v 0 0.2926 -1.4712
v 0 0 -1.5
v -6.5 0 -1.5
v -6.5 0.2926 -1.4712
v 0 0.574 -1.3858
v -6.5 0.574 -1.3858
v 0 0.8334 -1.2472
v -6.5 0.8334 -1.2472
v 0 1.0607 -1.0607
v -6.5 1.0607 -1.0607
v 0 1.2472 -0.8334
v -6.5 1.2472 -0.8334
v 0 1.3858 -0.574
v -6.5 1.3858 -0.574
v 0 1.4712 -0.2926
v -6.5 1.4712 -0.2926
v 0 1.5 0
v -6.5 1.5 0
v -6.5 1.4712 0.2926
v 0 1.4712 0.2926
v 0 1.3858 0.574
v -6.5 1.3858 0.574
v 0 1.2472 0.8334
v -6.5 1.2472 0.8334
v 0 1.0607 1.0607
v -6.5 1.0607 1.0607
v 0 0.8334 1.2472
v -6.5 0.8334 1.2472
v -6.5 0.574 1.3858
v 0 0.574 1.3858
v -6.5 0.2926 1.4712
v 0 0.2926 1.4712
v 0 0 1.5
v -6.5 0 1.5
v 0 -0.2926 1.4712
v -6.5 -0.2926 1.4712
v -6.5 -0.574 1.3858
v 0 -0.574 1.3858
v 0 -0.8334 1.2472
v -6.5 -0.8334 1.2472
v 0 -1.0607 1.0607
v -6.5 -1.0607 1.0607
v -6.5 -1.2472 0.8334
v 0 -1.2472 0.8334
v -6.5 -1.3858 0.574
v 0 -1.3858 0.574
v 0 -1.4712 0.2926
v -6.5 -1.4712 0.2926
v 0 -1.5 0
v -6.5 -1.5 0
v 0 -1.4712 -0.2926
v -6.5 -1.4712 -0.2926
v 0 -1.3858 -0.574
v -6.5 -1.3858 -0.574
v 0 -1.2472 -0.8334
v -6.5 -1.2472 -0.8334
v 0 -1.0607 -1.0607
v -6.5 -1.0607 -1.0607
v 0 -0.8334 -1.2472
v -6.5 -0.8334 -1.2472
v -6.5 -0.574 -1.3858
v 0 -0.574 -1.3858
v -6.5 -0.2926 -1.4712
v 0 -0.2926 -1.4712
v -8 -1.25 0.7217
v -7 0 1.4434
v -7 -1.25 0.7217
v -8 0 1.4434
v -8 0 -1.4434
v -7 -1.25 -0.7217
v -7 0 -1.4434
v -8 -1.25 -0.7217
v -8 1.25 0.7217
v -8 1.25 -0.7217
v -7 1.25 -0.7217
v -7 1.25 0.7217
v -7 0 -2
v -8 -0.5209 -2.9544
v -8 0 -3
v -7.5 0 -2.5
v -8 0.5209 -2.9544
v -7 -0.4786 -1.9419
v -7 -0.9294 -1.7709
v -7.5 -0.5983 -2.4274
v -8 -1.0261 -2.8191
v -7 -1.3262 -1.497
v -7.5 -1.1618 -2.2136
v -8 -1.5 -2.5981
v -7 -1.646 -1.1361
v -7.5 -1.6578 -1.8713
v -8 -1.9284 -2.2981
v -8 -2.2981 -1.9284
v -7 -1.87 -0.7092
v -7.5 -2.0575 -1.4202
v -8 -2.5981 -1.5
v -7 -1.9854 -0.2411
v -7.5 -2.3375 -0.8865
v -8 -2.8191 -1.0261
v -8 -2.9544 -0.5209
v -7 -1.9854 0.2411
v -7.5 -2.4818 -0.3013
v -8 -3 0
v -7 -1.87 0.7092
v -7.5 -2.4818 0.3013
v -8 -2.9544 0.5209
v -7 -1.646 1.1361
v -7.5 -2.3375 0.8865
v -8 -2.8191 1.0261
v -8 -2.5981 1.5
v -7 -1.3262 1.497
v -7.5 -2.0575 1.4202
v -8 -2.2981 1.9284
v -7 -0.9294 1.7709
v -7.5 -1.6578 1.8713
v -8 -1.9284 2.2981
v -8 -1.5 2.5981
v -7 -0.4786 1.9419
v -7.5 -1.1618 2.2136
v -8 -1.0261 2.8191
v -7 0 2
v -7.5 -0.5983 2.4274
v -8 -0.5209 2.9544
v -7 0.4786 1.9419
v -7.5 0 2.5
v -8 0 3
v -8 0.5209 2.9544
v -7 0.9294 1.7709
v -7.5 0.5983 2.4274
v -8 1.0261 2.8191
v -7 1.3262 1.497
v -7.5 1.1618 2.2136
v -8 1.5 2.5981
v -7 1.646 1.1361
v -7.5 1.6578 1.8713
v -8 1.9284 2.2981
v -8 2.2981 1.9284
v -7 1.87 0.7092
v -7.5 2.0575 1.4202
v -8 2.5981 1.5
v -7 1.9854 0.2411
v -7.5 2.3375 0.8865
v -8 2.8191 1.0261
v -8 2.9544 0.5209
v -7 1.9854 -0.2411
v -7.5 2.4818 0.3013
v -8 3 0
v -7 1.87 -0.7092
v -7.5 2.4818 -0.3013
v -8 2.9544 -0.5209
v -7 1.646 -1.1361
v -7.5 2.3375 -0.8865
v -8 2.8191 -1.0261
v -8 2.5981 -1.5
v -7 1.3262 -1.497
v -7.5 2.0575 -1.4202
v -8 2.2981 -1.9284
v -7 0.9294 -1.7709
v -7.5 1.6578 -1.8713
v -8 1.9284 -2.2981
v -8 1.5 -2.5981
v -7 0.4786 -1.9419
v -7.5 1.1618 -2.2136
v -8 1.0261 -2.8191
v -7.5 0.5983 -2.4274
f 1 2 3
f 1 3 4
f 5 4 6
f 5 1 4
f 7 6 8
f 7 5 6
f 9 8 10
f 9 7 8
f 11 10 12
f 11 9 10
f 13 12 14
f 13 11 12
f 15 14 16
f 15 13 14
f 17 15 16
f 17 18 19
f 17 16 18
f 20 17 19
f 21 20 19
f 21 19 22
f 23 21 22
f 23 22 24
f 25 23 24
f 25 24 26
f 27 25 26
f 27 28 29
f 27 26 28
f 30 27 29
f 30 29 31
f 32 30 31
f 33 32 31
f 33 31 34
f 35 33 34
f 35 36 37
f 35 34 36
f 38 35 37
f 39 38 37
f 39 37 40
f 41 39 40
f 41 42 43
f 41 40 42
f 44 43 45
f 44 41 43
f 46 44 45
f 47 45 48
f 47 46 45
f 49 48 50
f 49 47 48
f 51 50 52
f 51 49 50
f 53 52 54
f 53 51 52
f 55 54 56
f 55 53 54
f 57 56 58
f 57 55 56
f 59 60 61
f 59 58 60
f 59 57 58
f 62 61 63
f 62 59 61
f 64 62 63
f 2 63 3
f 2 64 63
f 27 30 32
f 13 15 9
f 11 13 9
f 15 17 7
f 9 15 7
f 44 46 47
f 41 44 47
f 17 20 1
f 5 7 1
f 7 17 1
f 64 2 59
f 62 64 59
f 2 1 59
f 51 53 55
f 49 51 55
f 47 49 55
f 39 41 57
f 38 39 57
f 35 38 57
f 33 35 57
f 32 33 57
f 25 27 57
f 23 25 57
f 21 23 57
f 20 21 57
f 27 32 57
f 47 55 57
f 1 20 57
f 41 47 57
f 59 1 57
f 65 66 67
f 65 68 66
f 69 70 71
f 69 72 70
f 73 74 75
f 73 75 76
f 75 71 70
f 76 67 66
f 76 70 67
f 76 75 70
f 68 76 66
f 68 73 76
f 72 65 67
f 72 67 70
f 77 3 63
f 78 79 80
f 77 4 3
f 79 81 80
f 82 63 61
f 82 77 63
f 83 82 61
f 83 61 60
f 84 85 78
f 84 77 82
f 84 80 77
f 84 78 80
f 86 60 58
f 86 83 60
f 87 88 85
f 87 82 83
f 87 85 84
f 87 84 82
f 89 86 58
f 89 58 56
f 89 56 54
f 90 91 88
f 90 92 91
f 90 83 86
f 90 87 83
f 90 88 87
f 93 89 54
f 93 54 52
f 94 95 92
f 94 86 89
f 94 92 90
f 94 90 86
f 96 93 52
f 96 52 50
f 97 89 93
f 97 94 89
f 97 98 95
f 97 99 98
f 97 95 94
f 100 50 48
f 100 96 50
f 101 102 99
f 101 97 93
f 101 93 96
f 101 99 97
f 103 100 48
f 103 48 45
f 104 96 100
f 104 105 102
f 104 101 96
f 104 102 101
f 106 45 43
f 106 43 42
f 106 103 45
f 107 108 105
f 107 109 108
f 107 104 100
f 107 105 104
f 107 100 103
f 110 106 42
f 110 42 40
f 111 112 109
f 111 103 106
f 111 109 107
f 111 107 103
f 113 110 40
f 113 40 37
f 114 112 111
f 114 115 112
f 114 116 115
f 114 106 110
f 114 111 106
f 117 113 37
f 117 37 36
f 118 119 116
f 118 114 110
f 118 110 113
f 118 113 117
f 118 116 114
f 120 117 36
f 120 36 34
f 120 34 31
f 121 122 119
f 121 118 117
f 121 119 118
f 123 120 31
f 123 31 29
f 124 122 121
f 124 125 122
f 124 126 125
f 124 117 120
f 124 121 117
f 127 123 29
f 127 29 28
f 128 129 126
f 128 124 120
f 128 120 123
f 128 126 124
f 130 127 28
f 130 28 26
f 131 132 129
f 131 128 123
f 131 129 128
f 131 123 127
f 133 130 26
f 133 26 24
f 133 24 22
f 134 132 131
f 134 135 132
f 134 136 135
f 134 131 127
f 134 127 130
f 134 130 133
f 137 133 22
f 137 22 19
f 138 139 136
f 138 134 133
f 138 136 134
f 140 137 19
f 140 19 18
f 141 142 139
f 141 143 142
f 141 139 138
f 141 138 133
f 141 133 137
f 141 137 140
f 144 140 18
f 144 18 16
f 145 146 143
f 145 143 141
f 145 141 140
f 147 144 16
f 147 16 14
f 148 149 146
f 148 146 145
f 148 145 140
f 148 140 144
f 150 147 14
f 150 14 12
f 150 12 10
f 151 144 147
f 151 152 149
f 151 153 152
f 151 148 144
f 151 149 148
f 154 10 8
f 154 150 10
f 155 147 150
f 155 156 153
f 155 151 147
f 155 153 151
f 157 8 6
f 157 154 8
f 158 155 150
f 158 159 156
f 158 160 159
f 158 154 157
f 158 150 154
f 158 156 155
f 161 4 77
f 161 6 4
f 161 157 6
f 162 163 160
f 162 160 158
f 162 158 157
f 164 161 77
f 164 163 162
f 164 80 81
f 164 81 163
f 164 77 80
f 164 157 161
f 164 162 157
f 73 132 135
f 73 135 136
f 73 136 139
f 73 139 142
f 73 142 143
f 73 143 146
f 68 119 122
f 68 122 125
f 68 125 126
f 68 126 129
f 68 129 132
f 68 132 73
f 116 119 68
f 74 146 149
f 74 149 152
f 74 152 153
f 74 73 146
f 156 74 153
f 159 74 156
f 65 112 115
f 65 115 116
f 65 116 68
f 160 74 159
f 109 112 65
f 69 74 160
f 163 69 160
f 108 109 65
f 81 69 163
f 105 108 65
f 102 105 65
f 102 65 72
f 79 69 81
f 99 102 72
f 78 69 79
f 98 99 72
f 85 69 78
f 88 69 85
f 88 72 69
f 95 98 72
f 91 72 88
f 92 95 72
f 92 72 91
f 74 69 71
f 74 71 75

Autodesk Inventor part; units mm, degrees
ref_plane "YZ Plane" through (0, 0, 0) normal (1, 0, 0) x (0, 1, 0)
ref_plane "XZ Plane" through (0, 0, 0) normal (0, 1, 0) x (-1, 0, 0)
ref_plane "XY Plane" through (0, 0, 0) normal (0, 0, 1) x (1, 0, 0)
sketch "Esquisse1" plane through (0, 0, 0) normal (0, 1, 0) x (-1, 0, 0)
  line L0 (0, 0) -> (8, 0)
  line L1 (8, 0) -> (8, -3)
  line L2 (8, -3) -> (6.5, -1.5)
  line L3 (6.5, -1.5) -> (0, -1.5)
  line L4 (0, -1.5) -> (0, 0)
  line L5 (8, 0) -> (8, 3)
  line L6 (8, 3) -> (6.5, 1.5)
  line L7 (6.5, 1.5) -> (0, 1.5)
  line L8 (0, 1.5) -> (0, 0)
  dimension "d0" = 90
  dimension "d1" = 3
  dimension "d2" = 6
  dimension "d3" = 8
revolve "Révolution1" add sketch "Esquisse1" angle 360 about axis through (0, 0, 0) along (-1, 0, 0) contours L0 L1 L2 L3 L4
sketch "Esquisse2" plane through (-8, 0, 0) normal (-1, 0, 0) x (0, 0, 1)
  line L0 (0.7217, 1.25) -> (1.4434, 0)
  line L1 (1.4434, 0) -> (0.7217, -1.25)
  line L2 (0.7217, -1.25) -> (-0.7217, -1.25)
  line L3 (-0.7217, -1.25) -> (-1.4434, 0)
  line L4 (-1.4434, 0) -> (-0.7217, 1.25)
  line L5 (-0.7217, 1.25) -> (0.7217, 1.25)
  point P0 (0, 0)
  point P1 (0, 0)
  dimension "d5" = 2.5
extrude "Extrusion1" cut sketch "Esquisse2" against normal blind 1
properties part number "fraisee"
